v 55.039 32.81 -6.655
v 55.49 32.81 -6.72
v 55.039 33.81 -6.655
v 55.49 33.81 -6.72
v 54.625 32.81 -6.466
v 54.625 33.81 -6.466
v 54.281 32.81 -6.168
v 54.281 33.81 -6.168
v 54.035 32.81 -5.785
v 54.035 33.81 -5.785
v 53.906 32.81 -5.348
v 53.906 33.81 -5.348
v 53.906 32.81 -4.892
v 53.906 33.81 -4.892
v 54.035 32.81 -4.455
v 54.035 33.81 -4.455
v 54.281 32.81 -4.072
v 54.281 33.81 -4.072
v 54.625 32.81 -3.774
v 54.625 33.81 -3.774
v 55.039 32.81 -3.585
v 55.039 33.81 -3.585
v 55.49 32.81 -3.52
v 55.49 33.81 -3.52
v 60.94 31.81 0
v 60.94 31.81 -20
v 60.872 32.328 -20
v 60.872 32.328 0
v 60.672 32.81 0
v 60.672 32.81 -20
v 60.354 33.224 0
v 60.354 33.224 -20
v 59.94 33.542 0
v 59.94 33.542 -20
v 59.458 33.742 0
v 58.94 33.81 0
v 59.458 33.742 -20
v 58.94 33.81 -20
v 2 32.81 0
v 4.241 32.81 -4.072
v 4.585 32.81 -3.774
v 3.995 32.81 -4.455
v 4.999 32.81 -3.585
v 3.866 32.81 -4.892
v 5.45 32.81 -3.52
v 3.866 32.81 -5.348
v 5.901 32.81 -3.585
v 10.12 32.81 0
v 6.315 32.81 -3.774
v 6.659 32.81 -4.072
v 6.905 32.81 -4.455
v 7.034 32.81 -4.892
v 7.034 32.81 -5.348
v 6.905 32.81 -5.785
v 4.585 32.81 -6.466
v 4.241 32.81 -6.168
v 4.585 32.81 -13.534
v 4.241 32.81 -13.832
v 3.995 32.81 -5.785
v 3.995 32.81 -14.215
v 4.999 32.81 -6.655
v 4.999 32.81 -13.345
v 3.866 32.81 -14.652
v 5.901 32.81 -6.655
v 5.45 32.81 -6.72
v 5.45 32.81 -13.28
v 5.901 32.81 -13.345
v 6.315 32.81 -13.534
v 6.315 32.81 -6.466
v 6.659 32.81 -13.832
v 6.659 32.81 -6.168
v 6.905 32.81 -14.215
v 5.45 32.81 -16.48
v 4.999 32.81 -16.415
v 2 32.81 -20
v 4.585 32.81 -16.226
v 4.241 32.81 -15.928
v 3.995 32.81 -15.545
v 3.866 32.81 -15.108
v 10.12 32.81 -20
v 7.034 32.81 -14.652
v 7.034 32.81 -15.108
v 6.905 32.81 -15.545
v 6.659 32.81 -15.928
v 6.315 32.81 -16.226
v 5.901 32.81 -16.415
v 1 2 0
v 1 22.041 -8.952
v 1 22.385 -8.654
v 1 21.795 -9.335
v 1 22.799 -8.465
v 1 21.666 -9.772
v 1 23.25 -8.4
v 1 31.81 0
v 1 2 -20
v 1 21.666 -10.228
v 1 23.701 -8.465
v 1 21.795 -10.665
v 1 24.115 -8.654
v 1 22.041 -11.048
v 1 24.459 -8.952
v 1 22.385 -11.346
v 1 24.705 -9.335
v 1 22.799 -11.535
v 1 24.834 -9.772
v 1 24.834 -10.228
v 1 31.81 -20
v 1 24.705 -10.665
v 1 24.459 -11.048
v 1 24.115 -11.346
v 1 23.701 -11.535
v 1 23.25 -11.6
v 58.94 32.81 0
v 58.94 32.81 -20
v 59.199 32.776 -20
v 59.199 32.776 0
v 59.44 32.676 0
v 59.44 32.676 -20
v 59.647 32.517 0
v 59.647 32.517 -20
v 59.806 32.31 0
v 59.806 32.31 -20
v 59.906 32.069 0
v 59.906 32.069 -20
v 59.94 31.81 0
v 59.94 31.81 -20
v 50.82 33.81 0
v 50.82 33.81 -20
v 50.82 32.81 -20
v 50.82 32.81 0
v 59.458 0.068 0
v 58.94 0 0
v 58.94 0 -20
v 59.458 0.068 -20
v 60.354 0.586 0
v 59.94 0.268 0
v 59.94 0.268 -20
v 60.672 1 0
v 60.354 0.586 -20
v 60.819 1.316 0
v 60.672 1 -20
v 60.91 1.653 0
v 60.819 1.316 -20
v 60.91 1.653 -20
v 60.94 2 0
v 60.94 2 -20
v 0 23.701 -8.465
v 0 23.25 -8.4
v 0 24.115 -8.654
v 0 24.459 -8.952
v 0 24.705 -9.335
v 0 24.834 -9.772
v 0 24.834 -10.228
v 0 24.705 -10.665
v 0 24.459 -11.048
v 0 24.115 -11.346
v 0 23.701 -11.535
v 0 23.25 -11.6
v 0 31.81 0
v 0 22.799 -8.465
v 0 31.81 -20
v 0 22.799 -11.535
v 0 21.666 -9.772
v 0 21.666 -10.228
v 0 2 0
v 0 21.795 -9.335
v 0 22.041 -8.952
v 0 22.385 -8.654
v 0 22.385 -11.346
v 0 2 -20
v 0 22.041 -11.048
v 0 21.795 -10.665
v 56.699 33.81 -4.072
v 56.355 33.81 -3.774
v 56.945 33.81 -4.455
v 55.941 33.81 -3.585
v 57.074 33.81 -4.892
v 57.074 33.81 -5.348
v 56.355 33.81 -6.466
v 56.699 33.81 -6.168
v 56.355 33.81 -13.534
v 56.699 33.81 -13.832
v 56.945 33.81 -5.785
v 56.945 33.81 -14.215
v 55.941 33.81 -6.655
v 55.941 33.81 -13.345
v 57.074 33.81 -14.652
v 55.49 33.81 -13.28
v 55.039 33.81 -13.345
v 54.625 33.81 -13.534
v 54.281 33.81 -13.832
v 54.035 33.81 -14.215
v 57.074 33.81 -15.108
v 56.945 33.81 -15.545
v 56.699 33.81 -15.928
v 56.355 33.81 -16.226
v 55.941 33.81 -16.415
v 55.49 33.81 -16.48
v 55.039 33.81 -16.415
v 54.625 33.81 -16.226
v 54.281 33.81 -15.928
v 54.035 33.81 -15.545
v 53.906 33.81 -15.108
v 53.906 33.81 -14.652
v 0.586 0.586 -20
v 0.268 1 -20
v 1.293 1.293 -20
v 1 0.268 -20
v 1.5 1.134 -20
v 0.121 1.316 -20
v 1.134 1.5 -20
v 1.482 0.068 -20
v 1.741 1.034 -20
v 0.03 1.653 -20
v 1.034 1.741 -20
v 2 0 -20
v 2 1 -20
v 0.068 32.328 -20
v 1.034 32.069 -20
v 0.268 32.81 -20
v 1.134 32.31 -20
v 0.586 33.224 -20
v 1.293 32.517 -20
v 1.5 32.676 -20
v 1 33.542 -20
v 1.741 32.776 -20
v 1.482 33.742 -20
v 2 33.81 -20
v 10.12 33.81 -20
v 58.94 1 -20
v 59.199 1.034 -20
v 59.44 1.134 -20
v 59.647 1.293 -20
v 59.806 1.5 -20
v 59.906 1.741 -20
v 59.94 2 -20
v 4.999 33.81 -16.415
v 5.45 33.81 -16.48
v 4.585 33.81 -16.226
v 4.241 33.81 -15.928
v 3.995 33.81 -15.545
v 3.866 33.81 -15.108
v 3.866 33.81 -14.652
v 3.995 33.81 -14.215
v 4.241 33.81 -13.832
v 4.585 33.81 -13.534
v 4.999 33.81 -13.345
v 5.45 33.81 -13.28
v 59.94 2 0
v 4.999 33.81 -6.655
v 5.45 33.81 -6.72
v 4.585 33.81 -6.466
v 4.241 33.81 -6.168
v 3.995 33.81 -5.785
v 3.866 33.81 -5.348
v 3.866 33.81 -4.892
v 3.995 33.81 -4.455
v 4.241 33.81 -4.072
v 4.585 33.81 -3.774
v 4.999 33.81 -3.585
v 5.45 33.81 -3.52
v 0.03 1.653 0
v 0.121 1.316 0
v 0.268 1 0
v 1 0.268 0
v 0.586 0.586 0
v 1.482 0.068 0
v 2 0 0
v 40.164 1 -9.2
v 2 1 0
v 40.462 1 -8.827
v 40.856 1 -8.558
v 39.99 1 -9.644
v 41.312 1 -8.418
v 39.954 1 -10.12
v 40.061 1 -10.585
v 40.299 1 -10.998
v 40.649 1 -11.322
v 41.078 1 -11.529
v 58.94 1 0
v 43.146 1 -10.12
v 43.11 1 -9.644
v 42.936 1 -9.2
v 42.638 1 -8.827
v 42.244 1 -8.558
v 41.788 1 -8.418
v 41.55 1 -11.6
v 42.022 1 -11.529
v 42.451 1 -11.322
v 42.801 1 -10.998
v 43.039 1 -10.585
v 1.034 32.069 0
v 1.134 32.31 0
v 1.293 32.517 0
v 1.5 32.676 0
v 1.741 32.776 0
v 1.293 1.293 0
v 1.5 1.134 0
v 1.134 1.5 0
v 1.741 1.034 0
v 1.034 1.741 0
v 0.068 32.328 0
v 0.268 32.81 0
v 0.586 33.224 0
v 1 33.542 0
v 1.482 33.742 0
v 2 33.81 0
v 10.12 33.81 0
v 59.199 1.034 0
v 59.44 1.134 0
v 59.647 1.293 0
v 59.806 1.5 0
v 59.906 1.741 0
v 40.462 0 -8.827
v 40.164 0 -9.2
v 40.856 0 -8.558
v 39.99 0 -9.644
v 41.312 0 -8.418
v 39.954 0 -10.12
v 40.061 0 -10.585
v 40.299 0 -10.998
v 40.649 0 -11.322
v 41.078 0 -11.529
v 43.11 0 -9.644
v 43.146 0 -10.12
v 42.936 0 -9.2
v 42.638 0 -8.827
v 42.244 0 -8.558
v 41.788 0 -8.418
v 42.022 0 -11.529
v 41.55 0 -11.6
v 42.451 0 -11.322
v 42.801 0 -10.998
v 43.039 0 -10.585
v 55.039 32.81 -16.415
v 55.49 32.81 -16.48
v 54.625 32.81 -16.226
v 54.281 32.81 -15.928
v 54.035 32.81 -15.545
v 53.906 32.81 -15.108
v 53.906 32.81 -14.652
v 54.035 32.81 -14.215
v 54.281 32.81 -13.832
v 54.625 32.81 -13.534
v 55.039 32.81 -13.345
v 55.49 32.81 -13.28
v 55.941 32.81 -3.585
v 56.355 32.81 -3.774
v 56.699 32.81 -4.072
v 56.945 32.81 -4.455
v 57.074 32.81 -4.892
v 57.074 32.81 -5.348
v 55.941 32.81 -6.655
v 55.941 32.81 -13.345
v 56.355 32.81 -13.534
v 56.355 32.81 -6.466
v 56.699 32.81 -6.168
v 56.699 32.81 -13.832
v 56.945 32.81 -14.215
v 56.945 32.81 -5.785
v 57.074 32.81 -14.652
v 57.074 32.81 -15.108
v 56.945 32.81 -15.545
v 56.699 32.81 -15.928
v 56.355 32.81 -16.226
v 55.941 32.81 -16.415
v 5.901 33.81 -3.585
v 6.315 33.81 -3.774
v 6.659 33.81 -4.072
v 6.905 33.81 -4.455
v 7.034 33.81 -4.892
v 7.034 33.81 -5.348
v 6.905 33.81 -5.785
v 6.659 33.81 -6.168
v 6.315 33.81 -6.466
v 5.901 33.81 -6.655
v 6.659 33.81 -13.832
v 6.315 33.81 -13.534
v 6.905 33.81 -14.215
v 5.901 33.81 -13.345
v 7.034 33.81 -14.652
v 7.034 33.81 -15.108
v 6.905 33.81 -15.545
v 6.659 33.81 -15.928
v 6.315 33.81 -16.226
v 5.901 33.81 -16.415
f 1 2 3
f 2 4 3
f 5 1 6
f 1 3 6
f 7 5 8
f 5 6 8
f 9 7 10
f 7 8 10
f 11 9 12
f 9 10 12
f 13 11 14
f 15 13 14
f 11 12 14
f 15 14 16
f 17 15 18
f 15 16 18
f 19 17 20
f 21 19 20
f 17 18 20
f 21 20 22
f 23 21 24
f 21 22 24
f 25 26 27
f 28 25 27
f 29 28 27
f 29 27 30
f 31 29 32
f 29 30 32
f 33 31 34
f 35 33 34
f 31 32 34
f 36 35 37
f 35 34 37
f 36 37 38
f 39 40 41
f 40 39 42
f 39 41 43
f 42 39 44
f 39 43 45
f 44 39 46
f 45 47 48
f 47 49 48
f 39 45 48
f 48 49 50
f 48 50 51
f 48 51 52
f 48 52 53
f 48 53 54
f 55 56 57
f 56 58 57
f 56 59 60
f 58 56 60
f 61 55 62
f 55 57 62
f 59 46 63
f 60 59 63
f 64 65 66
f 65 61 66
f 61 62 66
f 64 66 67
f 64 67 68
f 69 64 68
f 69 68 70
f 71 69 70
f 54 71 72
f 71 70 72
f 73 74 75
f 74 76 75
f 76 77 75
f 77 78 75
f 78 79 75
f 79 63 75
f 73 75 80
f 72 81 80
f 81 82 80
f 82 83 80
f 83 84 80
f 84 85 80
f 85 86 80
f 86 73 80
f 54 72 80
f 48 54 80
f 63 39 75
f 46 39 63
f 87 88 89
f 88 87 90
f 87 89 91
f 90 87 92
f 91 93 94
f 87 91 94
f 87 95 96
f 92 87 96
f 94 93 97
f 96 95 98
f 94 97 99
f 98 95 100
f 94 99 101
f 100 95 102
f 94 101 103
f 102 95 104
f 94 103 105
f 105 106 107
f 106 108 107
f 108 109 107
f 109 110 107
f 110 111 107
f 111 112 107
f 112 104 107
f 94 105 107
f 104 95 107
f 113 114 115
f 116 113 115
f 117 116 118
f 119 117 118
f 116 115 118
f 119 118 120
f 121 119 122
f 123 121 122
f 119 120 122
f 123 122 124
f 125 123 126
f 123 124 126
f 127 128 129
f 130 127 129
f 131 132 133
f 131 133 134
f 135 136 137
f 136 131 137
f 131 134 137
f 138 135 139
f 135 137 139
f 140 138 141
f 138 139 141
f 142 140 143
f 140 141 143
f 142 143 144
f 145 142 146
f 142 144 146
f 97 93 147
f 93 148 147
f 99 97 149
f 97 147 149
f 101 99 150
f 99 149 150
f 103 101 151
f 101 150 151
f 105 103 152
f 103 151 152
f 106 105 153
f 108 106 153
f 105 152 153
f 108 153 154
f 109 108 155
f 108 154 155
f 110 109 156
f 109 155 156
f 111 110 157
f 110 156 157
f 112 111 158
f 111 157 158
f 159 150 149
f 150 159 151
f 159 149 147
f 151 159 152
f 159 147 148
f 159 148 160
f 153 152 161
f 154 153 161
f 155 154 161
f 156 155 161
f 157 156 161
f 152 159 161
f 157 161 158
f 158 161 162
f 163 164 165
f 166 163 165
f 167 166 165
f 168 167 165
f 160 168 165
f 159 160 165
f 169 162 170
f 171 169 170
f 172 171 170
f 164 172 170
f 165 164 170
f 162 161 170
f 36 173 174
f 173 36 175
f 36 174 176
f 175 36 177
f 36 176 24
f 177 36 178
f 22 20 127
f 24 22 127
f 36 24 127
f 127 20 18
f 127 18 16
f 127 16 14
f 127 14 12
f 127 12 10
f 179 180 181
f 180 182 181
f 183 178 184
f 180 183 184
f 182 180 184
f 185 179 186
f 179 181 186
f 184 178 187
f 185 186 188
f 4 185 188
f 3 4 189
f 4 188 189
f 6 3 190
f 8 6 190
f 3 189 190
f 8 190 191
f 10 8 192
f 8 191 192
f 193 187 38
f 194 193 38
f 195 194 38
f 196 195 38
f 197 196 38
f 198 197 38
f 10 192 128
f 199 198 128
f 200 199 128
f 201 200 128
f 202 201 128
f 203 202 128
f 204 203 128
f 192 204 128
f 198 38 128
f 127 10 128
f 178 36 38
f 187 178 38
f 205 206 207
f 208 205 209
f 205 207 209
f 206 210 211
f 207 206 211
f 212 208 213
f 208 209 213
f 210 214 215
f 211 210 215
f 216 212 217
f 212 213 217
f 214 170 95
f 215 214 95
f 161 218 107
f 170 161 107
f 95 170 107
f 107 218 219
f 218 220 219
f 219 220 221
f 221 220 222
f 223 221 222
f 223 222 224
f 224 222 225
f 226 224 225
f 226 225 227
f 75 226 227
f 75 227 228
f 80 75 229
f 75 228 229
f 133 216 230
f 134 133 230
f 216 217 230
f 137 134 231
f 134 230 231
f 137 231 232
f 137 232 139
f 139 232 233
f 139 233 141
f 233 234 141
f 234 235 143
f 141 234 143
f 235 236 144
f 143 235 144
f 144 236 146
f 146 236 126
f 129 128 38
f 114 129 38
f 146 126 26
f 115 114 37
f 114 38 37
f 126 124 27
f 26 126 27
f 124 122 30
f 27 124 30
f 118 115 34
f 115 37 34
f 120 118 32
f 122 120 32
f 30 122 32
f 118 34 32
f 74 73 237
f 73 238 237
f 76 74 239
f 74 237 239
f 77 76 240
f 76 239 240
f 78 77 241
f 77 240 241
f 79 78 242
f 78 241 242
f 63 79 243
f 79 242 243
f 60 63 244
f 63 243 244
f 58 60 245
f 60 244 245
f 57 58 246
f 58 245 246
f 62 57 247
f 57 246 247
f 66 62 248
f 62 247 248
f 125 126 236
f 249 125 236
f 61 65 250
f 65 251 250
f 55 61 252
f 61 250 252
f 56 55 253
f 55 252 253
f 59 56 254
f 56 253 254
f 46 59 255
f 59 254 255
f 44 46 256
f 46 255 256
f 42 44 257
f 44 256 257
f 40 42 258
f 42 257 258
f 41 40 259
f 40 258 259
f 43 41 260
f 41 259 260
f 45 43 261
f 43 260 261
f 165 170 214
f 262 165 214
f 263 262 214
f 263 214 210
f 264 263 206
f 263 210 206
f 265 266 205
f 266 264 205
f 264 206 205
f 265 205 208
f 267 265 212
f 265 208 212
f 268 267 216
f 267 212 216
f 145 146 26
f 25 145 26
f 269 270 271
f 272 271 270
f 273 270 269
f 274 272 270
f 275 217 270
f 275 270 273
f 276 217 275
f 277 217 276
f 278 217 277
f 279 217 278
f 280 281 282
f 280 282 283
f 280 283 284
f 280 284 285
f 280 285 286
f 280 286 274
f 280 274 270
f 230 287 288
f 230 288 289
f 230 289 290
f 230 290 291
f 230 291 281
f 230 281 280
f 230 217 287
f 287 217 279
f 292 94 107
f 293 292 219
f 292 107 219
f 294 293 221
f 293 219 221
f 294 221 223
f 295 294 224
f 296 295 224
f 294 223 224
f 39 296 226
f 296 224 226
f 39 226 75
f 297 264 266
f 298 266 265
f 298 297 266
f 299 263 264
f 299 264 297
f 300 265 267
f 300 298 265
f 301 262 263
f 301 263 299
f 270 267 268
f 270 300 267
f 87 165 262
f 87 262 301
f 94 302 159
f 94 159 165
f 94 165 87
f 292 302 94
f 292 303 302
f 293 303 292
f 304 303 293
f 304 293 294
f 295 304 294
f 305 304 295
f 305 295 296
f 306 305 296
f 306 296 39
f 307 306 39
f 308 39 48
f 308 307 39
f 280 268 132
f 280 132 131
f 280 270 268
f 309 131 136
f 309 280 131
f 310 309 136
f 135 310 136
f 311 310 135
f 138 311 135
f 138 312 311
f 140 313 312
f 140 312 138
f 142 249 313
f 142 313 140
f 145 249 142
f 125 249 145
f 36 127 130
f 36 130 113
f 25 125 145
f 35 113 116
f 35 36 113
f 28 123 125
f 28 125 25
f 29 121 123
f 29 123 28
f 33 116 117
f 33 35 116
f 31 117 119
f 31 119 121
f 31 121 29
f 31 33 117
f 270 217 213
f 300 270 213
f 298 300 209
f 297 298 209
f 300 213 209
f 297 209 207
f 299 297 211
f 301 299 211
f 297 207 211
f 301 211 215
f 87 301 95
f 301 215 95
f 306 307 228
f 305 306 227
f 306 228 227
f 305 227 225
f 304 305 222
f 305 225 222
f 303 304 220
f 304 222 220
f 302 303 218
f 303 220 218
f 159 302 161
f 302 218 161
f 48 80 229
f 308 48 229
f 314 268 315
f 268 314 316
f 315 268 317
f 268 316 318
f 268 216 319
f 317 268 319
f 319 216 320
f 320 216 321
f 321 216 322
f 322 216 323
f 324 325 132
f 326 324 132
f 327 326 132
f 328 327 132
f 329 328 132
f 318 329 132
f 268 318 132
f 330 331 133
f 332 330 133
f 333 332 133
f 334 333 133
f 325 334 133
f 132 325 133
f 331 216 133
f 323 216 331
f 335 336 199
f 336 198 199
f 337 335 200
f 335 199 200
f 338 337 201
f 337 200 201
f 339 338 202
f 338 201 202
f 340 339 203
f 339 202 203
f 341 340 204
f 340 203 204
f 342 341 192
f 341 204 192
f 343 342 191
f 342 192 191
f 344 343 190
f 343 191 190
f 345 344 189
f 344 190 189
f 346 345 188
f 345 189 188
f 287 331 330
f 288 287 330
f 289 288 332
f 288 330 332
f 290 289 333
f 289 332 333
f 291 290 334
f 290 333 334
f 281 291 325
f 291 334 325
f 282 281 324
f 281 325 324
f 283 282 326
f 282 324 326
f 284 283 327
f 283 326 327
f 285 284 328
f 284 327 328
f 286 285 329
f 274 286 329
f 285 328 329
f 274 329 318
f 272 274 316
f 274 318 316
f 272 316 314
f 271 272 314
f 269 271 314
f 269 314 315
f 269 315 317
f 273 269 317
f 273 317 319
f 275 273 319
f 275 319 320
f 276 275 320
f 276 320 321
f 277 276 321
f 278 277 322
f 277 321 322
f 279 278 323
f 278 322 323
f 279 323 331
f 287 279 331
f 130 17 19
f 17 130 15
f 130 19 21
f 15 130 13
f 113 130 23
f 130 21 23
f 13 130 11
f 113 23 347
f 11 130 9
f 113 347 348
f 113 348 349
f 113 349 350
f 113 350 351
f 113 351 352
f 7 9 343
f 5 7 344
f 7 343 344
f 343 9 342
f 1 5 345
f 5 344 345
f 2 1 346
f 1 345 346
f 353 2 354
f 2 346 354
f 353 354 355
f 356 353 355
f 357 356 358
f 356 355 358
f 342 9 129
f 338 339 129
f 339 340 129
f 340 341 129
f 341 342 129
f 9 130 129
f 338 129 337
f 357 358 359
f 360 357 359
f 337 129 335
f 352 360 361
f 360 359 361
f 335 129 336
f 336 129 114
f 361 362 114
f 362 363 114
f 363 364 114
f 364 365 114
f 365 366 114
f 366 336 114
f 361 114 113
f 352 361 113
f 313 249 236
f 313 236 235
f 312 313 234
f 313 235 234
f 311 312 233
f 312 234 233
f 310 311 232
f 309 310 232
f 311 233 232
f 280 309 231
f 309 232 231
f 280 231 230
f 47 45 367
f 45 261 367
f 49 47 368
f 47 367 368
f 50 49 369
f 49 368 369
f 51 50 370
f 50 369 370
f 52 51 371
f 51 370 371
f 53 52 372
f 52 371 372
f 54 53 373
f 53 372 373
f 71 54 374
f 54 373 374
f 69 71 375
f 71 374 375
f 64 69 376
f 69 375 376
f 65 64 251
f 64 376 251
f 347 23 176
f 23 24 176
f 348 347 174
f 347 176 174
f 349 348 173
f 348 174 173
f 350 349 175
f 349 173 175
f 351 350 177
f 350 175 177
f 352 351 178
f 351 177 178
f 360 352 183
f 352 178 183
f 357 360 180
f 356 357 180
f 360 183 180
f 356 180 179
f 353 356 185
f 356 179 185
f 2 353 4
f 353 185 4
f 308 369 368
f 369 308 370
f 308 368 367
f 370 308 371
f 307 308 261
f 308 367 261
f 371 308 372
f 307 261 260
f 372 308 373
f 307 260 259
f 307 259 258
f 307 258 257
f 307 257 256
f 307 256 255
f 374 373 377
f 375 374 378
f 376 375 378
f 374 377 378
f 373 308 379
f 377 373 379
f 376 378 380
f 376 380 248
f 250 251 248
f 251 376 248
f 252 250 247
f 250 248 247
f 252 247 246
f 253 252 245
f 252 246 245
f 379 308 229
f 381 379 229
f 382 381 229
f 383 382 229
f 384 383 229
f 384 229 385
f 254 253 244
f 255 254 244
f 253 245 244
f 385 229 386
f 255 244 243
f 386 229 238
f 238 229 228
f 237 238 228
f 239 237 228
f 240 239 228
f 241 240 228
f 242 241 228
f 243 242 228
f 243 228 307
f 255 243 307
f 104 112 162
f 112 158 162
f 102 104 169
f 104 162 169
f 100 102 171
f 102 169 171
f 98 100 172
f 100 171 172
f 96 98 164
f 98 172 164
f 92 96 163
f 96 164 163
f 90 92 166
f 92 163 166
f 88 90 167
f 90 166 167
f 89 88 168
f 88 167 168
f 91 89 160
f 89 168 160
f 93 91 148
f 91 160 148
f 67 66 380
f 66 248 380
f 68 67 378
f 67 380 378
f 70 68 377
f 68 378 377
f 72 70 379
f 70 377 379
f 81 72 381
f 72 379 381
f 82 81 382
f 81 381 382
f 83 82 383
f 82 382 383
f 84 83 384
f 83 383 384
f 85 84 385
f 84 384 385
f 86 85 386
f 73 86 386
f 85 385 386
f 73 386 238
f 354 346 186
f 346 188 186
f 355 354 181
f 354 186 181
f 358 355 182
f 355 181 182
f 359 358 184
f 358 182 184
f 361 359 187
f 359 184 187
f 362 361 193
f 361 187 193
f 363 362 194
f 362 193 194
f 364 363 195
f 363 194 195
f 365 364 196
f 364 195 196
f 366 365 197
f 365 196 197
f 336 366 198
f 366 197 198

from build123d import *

# Parameters (mm, degrees)
SKETCH_2_W                = 60.94
SKETCH_2_H                = 20
EXTRUDE_1_DEPTH           = 1
SKETCH_3_W                = 1
SKETCH_3_H                = 20
EXTRUDE_2_DEPTH           = 32.81
SKETCH_4_W                = 1
SKETCH_4_H                = 20
EXTRUDE_3_DEPTH           = 32.81
SKETCH_9_W                = 20
SKETCH_9_H                = 1
EXTRUDE_8_DEPTH           = 9.12
SKETCH_10_W               = 20
SKETCH_10_H               = 1
EXTRUDE_9_DEPTH           = 9.12
SKETCH_13_R               = 1.6
CUT_EXTRUDE_2_DEPTH       = 1
SKETCH_14_R               = 1.6
CUT_EXTRUDE_3_DEPTH       = 1
SKETCH_15_R               = 1.6
CUT_EXTRUDE_4_DEPTH       = 1
SKETCH_16_R               = 1.6
CUT_EXTRUDE_5_DEPTH       = 1
SKETCH_17_R               = 1.6
CUT_EXTRUDE_6_DEPTH       = 1
CUT_EXTRUDE_7_REACH       = 74.504
SKETCH_18_R               = 1.6
SHEET_START               = 1
SHEET_METAL_1_OUTLINE_W   = 10.12
SHEET_METAL_1_OUTLINE_H   = 20
SHEET_METAL_1_OUTLINE_R   = 1.6
SHEET_METAL_1_DEPTH       = 32.81
SHEET_METAL_1_2_OUTLINE_W = 40.64238898
SHEET_METAL_1_2_OUTLINE_H = 20
SHEET_METAL_1_2_OUTLINE_R = 1.6
SHEET_METAL_1_2_DEPTH     = 1
SHEET_START_2             = -20
SHEET_METAL_1_3_DEPTH     = 20
SHEET_METAL_1_3_2_DEPTH   = 3.5199999
SHEET_START_3             = -3.5199999
SHEET_METAL_1_3_3_DEPTH   = 3.5199999
SHEET_START_4             = -13.2799999
SHEET_METAL_1_3_4_DEPTH   = 6.5599998
SHEET_METAL_1_3_5_DEPTH   = 1.6799998
SHEET_START_5             = -8.3999999
SHEET_METAL_1_3_6_DEPTH   = 1.6799998
SHEET_START_6             = -16.4800001
SHEET_METAL_1_3_7_DEPTH   = 12.9600002


with BuildPart() as part:
    # Sketch 2 → ﾎﾞｽ - 押し出し1 (new body)
    with BuildSketch(Plane(origin=(0, 0, 0), x_dir=(1, 0, 0), z_dir=(0, 1, 0))):
        with Locations((30.47, 10)):
            Rectangle(SKETCH_2_W, SKETCH_2_H)
    extrude(amount=EXTRUDE_1_DEPTH)

    # ｽｹｯﾁ3 → ﾎﾞｽ - 押し出し2 (add)
    with BuildSketch(Plane(origin=(0, 1, 0), x_dir=(1, 0, 0), z_dir=(0, 1, 0))):
        with Locations((60.44, 10)):
            Rectangle(SKETCH_3_W, SKETCH_3_H)
    extrude(amount=EXTRUDE_2_DEPTH)

    # ｽｹｯﾁ4 → ﾎﾞｽ - 押し出し3 (add)
    with BuildSketch(Plane(origin=(0, 1, 0), x_dir=(1, 0, 0), z_dir=(0, 1, 0))):
        with Locations((0.5, 10)):
            Rectangle(SKETCH_4_W, SKETCH_4_H)
    extrude(amount=EXTRUDE_3_DEPTH)

    # ｽｹｯﾁ9 → ﾎﾞｽ - 押し出し8 (add)
    with BuildSketch(Plane.ZY.offset(-59.94)):
        with Locations((-10, 33.31)):
            Rectangle(SKETCH_9_W, SKETCH_9_H)
    extrude(amount=EXTRUDE_8_DEPTH)

    # ｽｹｯﾁ10 → ﾎﾞｽ - 押し出し9 (add)
    with BuildSketch(Plane(origin=(1, 0, 0), x_dir=(0, 0, -1), z_dir=(1, 0, 0))):
        with Locations((10, 33.31)):
            Rectangle(SKETCH_10_W, SKETCH_10_H)
    extrude(amount=EXTRUDE_9_DEPTH)

    # ｽｹｯﾁ13 → ｶｯﾄ - 押し出し2 (cut)
    with BuildSketch(Plane(origin=(0, 33.81, 0), x_dir=(1, 0, 0), z_dir=(0, 1, 0))):
        with Locations(Location((55.49, 5.12, 0), (0, 0, 270))):
            Circle(SKETCH_13_R)
    extrude(amount=-CUT_EXTRUDE_2_DEPTH, mode=Mode.SUBTRACT)

    # ｽｹｯﾁ14 → ｶｯﾄ - 押し出し3 (cut)
    with BuildSketch(Plane(origin=(0, 33.81, 0), x_dir=(1, 0, 0), z_dir=(0, 1, 0))):
        with Locations(Location((55.49, 14.88, 0), (0, 0, 270))):
            Circle(SKETCH_14_R)
    extrude(amount=-CUT_EXTRUDE_3_DEPTH, mode=Mode.SUBTRACT)

    # ｽｹｯﾁ15 → ｶｯﾄ - 押し出し4 (cut)
    with BuildSketch(Plane(origin=(0, 33.81, 0), x_dir=(1, 0, 0), z_dir=(0, 1, 0))):
        with Locations(Location((5.45, 5.12, 0), (0, 0, 270))):
            Circle(SKETCH_15_R)
    extrude(amount=-CUT_EXTRUDE_4_DEPTH, mode=Mode.SUBTRACT)

    # ｽｹｯﾁ16 → ｶｯﾄ - 押し出し5 (cut)
    with BuildSketch(Plane(origin=(0, 33.81, 0), x_dir=(1, 0, 0), z_dir=(0, 1, 0))):
        with Locations(Location((5.45, 14.88, 0), (0, 0, 270))):
            Circle(SKETCH_16_R)
    extrude(amount=-CUT_EXTRUDE_5_DEPTH, mode=Mode.SUBTRACT)

    # ｽｹｯﾁ17 → ｶｯﾄ - 押し出し6 (cut)
    with BuildSketch(Plane(origin=(0, 0, 0), x_dir=(-1, 0, 0), z_dir=(0, -1, 0))):
        with Locations(Location((-41.55, 10, 0), (0, 0, 90))):
            Circle(SKETCH_17_R)
    extrude(amount=-CUT_EXTRUDE_6_DEPTH, mode=Mode.SUBTRACT)

    # ｽｹｯﾁ18 → ｶｯﾄ - 押し出し7 (cut, up to next)
    with BuildSketch(Plane.ZY, mode=Mode.PRIVATE) as cut_extrude_7_sk1:
        with Locations((-10, 23.25)):
            Circle(SKETCH_18_R)
    cut_extrude_7_tool1 = extrude(cut_extrude_7_sk1.sketch, amount=-CUT_EXTRUDE_7_REACH, mode=Mode.PRIVATE) & part.part
    add(cut_extrude_7_tool1.solids().sort_by_distance((0, 23.25, -10))[0], mode=Mode.SUBTRACT)

    # Sheet Metal 1: read off the stored shape, not the designer's step
    # Sheet Metal 1 outline → Sheet Metal 1 (cut)
    # profile 1 of 2: a face of its own
    with BuildSketch(Plane(origin=(0, 0, 0), x_dir=(1, 0, 0), z_dir=(0, 1, 0)).offset(SHEET_START)):
        with Locations((55.88, 10)):
            Rectangle(SHEET_METAL_1_OUTLINE_W, SHEET_METAL_1_OUTLINE_H)
        with Locations((55.49, 14.88)):
            Circle(SHEET_METAL_1_OUTLINE_R, mode=Mode.SUBTRACT)
        with Locations((55.49, 5.12)):
            Circle(SHEET_METAL_1_OUTLINE_R, mode=Mode.SUBTRACT)
    # profile 2 of 2: a face of its own
    with BuildSketch(Plane(origin=(0, 0, 0), x_dir=(1, 0, 0), z_dir=(0, 1, 0)).offset(SHEET_START)):
        with Locations((5.06, 10)):
            Rectangle(SHEET_METAL_1_OUTLINE_W, SHEET_METAL_1_OUTLINE_H)
        with Locations((5.45, 5.12)):
            Circle(SHEET_METAL_1_OUTLINE_R, mode=Mode.SUBTRACT)
        with Locations((5.45, 14.88)):
            Circle(SHEET_METAL_1_OUTLINE_R, mode=Mode.SUBTRACT)
    extrude(amount=SHEET_METAL_1_DEPTH, mode=Mode.SUBTRACT)

    # Sheet Metal 1 2 outline → Sheet Metal 1 2 (add)
    # profile 1 of 2: a face of its own
    with BuildSketch(Plane(origin=(0, 0, 0), x_dir=(1, 0, 0), z_dir=(0, 1, 0))):
        with Locations((81.26119449, 10)):
            Rectangle(SHEET_METAL_1_2_OUTLINE_W, SHEET_METAL_1_2_OUTLINE_H)
        with Locations((96.91238898, 5.12)):
            Circle(SHEET_METAL_1_2_OUTLINE_R, mode=Mode.SUBTRACT)
        with Locations((96.91238898, 14.88)):
            Circle(SHEET_METAL_1_2_OUTLINE_R, mode=Mode.SUBTRACT)
    # profile 2 of 2: a face of its own
    with BuildSketch(Plane(origin=(0, 0, 0), x_dir=(1, 0, 0), z_dir=(0, 1, 0))):
        with Locations((-20.32119449, 10)):
            Rectangle(SHEET_METAL_1_2_OUTLINE_W, SHEET_METAL_1_2_OUTLINE_H)
        with Locations((-35.97238898, 5.12)):
            Circle(SHEET_METAL_1_2_OUTLINE_R, mode=Mode.SUBTRACT)
        with Locations((-21.60619449, 10)):
            Circle(SHEET_METAL_1_2_OUTLINE_R, mode=Mode.SUBTRACT)
        with Locations((-35.97238898, 14.88)):
            Circle(SHEET_METAL_1_2_OUTLINE_R, mode=Mode.SUBTRACT)
    extrude(amount=SHEET_METAL_1_2_DEPTH)

    # Sheet Metal 1 3: read off the stored shape, not the designer's step
    # Sheet Metal 1 3 outline → Sheet Metal 1 3 (cut)
    with BuildSketch(Plane.XY.offset(SHEET_START_2)):
        with BuildLine():
            ThreePointArc((2, 0), (1, 0.267949193), (0.267949193, 1))
            Line((0.267949193, 1), (-40.64238898, 1))
            Line((-40.64238898, 1), (-40.64238898, 0))
            Line((-40.64238898, 0), (2, 0))
        make_face()
        with BuildLine():
            Line((101.58238898, 1), (60.672050807, 1))
            ThreePointArc((60.672050807, 1), (59.94, 0.267949193), (58.94, 0))
            Line((58.94, 0), (101.58238898, 0))
            Line((101.58238898, 0), (101.58238898, 1))
        make_face()
    extrude(amount=SHEET_METAL_1_3_DEPTH, mode=Mode.SUBTRACT)

    # Sheet Metal 1 3 2 outline → Sheet Metal 1 3 2 (add)
    with BuildSketch(Plane.XY.offset(SHEET_START_2)):
        with BuildLine():
            Line((2, 32.81), (10.12, 32.81))
            Line((10.12, 32.81), (10.12, 33.81))
            Line((10.12, 33.81), (2, 33.81))
            ThreePointArc((2, 33.81), (0.585786438, 33.224213562), (0, 31.81))
            Line((0, 31.81), (0, 2))
            ThreePointArc((0, 2), (0.068148348, 1.48236191), (0.267949193, 1))
            Line((0.267949193, 1), (2, 1))
            ThreePointArc((2, 1), (1.292893219, 1.292893219), (1, 2))
            Line((1, 2), (1, 31.81))
            ThreePointArc((1, 31.81), (1.292893219, 32.517106781), (2, 32.81))
        make_face()
        with BuildLine():
            Line((58.94, 33.81), (50.82, 33.81))
            Line((50.82, 33.81), (50.82, 32.81))
            Line((50.82, 32.81), (58.94, 32.81))
            ThreePointArc((58.94, 32.81), (59.647106781, 32.517106781), (59.94, 31.81))
            Line((59.94, 31.81), (59.94, 2))
            ThreePointArc((59.94, 2), (59.647106781, 1.292893219), (58.94, 1))
            Line((58.94, 1), (60.672050807, 1))
            ThreePointArc((60.672050807, 1), (60.871851652, 1.48236191), (60.94, 2))
            Line((60.94, 2), (60.94, 31.81))
            ThreePointArc((60.94, 31.81), (60.354213562, 33.224213562), (58.94, 33.81))
        make_face()
    extrude(amount=SHEET_METAL_1_3_2_DEPTH)

    # Sheet Metal 1 3 3 outline → Sheet Metal 1 3 3 (add)
    with BuildSketch(Plane.XY.offset(SHEET_START_3)):
        with BuildLine():
            Line((2, 32.81), (10.12, 32.81))
            Line((10.12, 32.81), (10.12, 33.81))
            Line((10.12, 33.81), (2, 33.81))
            ThreePointArc((2, 33.81), (0.585786438, 33.224213562), (0, 31.81))
            Line((0, 31.81), (0, 2))
            ThreePointArc((0, 2), (0.068148348, 1.48236191), (0.267949193, 1))
            Line((0.267949193, 1), (2, 1))
            ThreePointArc((2, 1), (1.292893219, 1.292893219), (1, 2))
            Line((1, 2), (1, 31.81))
            ThreePointArc((1, 31.81), (1.292893219, 32.517106781), (2, 32.81))
        make_face()
        with BuildLine():
            Line((58.94, 33.81), (50.82, 33.81))
            Line((50.82, 33.81), (50.82, 32.81))
            Line((50.82, 32.81), (58.94, 32.81))
            ThreePointArc((58.94, 32.81), (59.647106781, 32.517106781), (59.94, 31.81))
            Line((59.94, 31.81), (59.94, 2))
            ThreePointArc((59.94, 2), (59.647106781, 1.292893219), (58.94, 1))
            Line((58.94, 1), (60.672050807, 1))
            ThreePointArc((60.672050807, 1), (60.871851652, 1.48236191), (60.94, 2))
            Line((60.94, 2), (60.94, 31.81))
            ThreePointArc((60.94, 31.81), (60.354213562, 33.224213562), (58.94, 33.81))
        make_face()
    extrude(amount=SHEET_METAL_1_3_3_DEPTH)

    # Sheet Metal 1 3 4 outline → Sheet Metal 1 3 4 (add)
    with BuildSketch(Plane.XY.offset(SHEET_START_4)):
        with BuildLine():
            Line((58.94, 33.81), (50.82, 33.81))
            Line((50.82, 33.81), (50.82, 32.81))
            Line((50.82, 32.81), (58.94, 32.81))
            ThreePointArc((58.94, 32.81), (59.647106781, 32.517106781), (59.94, 31.81))
            Line((59.94, 31.81), (59.94, 2))
            ThreePointArc((59.94, 2), (59.647106781, 1.292893219), (58.94, 1))
            Line((58.94, 1), (60.672050807, 1))
            ThreePointArc((60.672050807, 1), (60.871851652, 1.48236191), (60.94, 2))
            Line((60.94, 2), (60.94, 31.81))
            ThreePointArc((60.94, 31.81), (60.354213562, 33.224213562), (58.94, 33.81))
        make_face()
    extrude(amount=SHEET_METAL_1_3_4_DEPTH)

    # Sheet Metal 1 3 5 outline → Sheet Metal 1 3 5 (add)
    with BuildSketch(Plane.XY.offset(SHEET_START_4)):
        with BuildLine():
            Line((2, 32.81), (10.12, 32.81))
            Line((10.12, 32.81), (10.12, 33.81))
            Line((10.12, 33.81), (2, 33.81))
            ThreePointArc((2, 33.81), (0.585786438, 33.224213562), (0, 31.81))
            Line((0, 31.81), (0, 2))
            ThreePointArc((0, 2), (0.068148348, 1.48236191), (0.267949193, 1))
            Line((0.267949193, 1), (2, 1))
            ThreePointArc((2, 1), (1.292893219, 1.292893219), (1, 2))
            Line((1, 2), (1, 31.81))
            ThreePointArc((1, 31.81), (1.292893219, 32.517106781), (2, 32.81))
        make_face()
    extrude(amount=SHEET_METAL_1_3_5_DEPTH)

    # Sheet Metal 1 3 6 outline → Sheet Metal 1 3 6 (add)
    with BuildSketch(Plane.XY.offset(SHEET_START_5)):
        with BuildLine():
            Line((2, 32.81), (10.12, 32.81))
            Line((10.12, 32.81), (10.12, 33.81))
            Line((10.12, 33.81), (2, 33.81))
            ThreePointArc((2, 33.81), (0.585786438, 33.224213562), (0, 31.81))
            Line((0, 31.81), (0, 2))
            ThreePointArc((0, 2), (0.068148348, 1.48236191), (0.267949193, 1))
            Line((0.267949193, 1), (2, 1))
            ThreePointArc((2, 1), (1.292893219, 1.292893219), (1, 2))
            Line((1, 2), (1, 31.81))
            ThreePointArc((1, 31.81), (1.292893219, 32.517106781), (2, 32.81))
        make_face()
    extrude(amount=SHEET_METAL_1_3_6_DEPTH)

    # Sheet Metal 1 3 7 outline → Sheet Metal 1 3 7 (add)
    with BuildSketch(Plane.XY.offset(SHEET_START_6)):
        with BuildLine():
            Line((2, 32.81), (10.12, 32.81))
            Line((10.12, 32.81), (10.12, 33.81))
            Line((10.12, 33.81), (2, 33.81))
            ThreePointArc((2, 33.81), (0.585786438, 33.224213562), (0, 31.81))
            Line((0, 31.81), (0, 2))
            ThreePointArc((0, 2), (0.068148348, 1.48236191), (0.267949193, 1))
            Line((0.267949193, 1), (2, 1))
            ThreePointArc((2, 1), (1.292893219, 1.292893219), (1, 2))
            Line((1, 2), (1, 31.81))
            ThreePointArc((1, 31.81), (1.292893219, 32.517106781), (2, 32.81))
        make_face()
        with BuildLine():
            ThreePointArc((59.94, 2), (59.647106781, 1.292893219), (58.94, 1))
            Line((58.94, 1), (60.672050807, 1))
            ThreePointArc((60.672050807, 1), (60.871851652, 1.48236191), (60.94, 2))
            Line((60.94, 2), (60.94, 31.81))
            ThreePointArc((60.94, 31.81), (60.354213562, 33.224213562), (58.94, 33.81))
            Line((58.94, 33.81), (50.82, 33.81))
            Line((50.82, 33.81), (50.82, 32.81))
            Line((50.82, 32.81), (58.94, 32.81))
            ThreePointArc((58.94, 32.81), (59.647106781, 32.517106781), (59.94, 31.81))
            Line((59.94, 31.81), (59.94, 2))
        make_face()
    extrude(amount=SHEET_METAL_1_3_7_DEPTH)

    # Sheet Metal 1 3 8: loft between two sections, ruled curve by curve
    sheet_metal_1_3_8_from = [
        Edge.make_three_point_arc((5.45, 32.81, -3.52), (7.05, 32.81, -5.12), (5.45, 32.81, -6.72)),
        Edge.make_three_point_arc((5.45, 32.81, -6.72), (3.85, 32.81, -5.12), (5.45, 32.81, -3.52)),
    ]
    sheet_metal_1_3_8_to = [
        Edge.make_three_point_arc((5.45, 33.81, -3.52), (7.05, 33.81, -5.12), (5.45, 33.81, -6.72)),
        Edge.make_three_point_arc((5.45, 33.81, -6.72), (3.85, 33.81, -5.12), (5.45, 33.81, -3.52)),
    ]
    sheet_metal_1_3_8 = Solid(Shell([*[Face.make_surface_from_curves(sheet_metal_1_3_8_from[k], sheet_metal_1_3_8_to[k]) for k in range(2)], Face(Wire(sheet_metal_1_3_8_from)), Face(Wire(sheet_metal_1_3_8_to))]))
    add(sheet_metal_1_3_8, mode=Mode.SUBTRACT)

    # Sheet Metal 1 3 9: loft between two sections, ruled curve by curve
    sheet_metal_1_3_9_from = [
        Edge.make_three_point_arc((5.45, 32.81, -13.28), (7.05, 32.81, -14.88), (5.45, 32.81, -16.48)),
        Edge.make_three_point_arc((5.45, 32.81, -16.48), (3.85, 32.81, -14.88), (5.45, 32.81, -13.28)),
    ]
    sheet_metal_1_3_9_to = [
        Edge.make_three_point_arc((5.45, 33.81, -13.28), (7.05, 33.81, -14.88), (5.45, 33.81, -16.48)),
        Edge.make_three_point_arc((5.45, 33.81, -16.48), (3.85, 33.81, -14.88), (5.45, 33.81, -13.28)),
    ]
    sheet_metal_1_3_9 = Solid(Shell([*[Face.make_surface_from_curves(sheet_metal_1_3_9_from[k], sheet_metal_1_3_9_to[k]) for k in range(2)], Face(Wire(sheet_metal_1_3_9_from)), Face(Wire(sheet_metal_1_3_9_to))]))
    add(sheet_metal_1_3_9, mode=Mode.SUBTRACT)

    # Sheet Metal 1 3 10: loft between two sections, ruled curve by curve
    sheet_metal_1_3_10_from = [
        Edge.make_three_point_arc((55.49, 32.81, -3.52), (57.09, 32.81, -5.12), (55.49, 32.81, -6.72)),
        Edge.make_three_point_arc((55.49, 32.81, -6.72), (53.89, 32.81, -5.12), (55.49, 32.81, -3.52)),
    ]
    sheet_metal_1_3_10_to = [
        Edge.make_three_point_arc((55.49, 33.81, -3.52), (57.09, 33.81, -5.12), (55.49, 33.81, -6.72)),
        Edge.make_three_point_arc((55.49, 33.81, -6.72), (53.89, 33.81, -5.12), (55.49, 33.81, -3.52)),
    ]
    sheet_metal_1_3_10 = Solid(Shell([*[Face.make_surface_from_curves(sheet_metal_1_3_10_from[k], sheet_metal_1_3_10_to[k]) for k in range(2)], Face(Wire(sheet_metal_1_3_10_from)), Face(Wire(sheet_metal_1_3_10_to))]))
    add(sheet_metal_1_3_10, mode=Mode.SUBTRACT)

    # Sheet Metal 1 3 11: loft between two sections, ruled curve by curve
    sheet_metal_1_3_11_from = [
        Edge.make_three_point_arc((55.49, 32.81, -13.28), (57.09, 32.81, -14.88), (55.49, 32.81, -16.48)),
        Edge.make_three_point_arc((55.49, 32.81, -16.48), (53.89, 32.81, -14.88), (55.49, 32.81, -13.28)),
    ]
    sheet_metal_1_3_11_to = [
        Edge.make_three_point_arc((55.49, 33.81, -13.28), (57.09, 33.81, -14.88), (55.49, 33.81, -16.48)),
        Edge.make_three_point_arc((55.49, 33.81, -16.48), (53.89, 33.81, -14.88), (55.49, 33.81, -13.28)),
    ]
    sheet_metal_1_3_11 = Solid(Shell([*[Face.make_surface_from_curves(sheet_metal_1_3_11_from[k], sheet_metal_1_3_11_to[k]) for k in range(2)], Face(Wire(sheet_metal_1_3_11_from)), Face(Wire(sheet_metal_1_3_11_to))]))
    add(sheet_metal_1_3_11, mode=Mode.SUBTRACT)

    # Sheet Metal 1 3 12: loft between two sections, ruled curve by curve
    sheet_metal_1_3_12_from = [
        Edge.make_three_point_arc((1, 23.25, -8.4), (1, 24.85, -10), (1, 23.25, -11.6)),
        Edge.make_three_point_arc((1, 23.25, -11.6), (1, 21.65, -10), (1, 23.25, -8.4)),
    ]
    sheet_metal_1_3_12_to = [
        Edge.make_three_point_arc((0, 23.25, -8.4), (0, 24.85, -10), (0, 23.25, -11.6)),
        Edge.make_three_point_arc((0, 23.25, -11.6), (0, 21.65, -10), (0, 23.25, -8.4)),
    ]
    sheet_metal_1_3_12 = Solid(Shell([*[Face.make_surface_from_curves(sheet_metal_1_3_12_from[k], sheet_metal_1_3_12_to[k]) for k in range(2)], Face(Wire(sheet_metal_1_3_12_from)), Face(Wire(sheet_metal_1_3_12_to))]))
    add(sheet_metal_1_3_12, mode=Mode.SUBTRACT)


solid = part.part
